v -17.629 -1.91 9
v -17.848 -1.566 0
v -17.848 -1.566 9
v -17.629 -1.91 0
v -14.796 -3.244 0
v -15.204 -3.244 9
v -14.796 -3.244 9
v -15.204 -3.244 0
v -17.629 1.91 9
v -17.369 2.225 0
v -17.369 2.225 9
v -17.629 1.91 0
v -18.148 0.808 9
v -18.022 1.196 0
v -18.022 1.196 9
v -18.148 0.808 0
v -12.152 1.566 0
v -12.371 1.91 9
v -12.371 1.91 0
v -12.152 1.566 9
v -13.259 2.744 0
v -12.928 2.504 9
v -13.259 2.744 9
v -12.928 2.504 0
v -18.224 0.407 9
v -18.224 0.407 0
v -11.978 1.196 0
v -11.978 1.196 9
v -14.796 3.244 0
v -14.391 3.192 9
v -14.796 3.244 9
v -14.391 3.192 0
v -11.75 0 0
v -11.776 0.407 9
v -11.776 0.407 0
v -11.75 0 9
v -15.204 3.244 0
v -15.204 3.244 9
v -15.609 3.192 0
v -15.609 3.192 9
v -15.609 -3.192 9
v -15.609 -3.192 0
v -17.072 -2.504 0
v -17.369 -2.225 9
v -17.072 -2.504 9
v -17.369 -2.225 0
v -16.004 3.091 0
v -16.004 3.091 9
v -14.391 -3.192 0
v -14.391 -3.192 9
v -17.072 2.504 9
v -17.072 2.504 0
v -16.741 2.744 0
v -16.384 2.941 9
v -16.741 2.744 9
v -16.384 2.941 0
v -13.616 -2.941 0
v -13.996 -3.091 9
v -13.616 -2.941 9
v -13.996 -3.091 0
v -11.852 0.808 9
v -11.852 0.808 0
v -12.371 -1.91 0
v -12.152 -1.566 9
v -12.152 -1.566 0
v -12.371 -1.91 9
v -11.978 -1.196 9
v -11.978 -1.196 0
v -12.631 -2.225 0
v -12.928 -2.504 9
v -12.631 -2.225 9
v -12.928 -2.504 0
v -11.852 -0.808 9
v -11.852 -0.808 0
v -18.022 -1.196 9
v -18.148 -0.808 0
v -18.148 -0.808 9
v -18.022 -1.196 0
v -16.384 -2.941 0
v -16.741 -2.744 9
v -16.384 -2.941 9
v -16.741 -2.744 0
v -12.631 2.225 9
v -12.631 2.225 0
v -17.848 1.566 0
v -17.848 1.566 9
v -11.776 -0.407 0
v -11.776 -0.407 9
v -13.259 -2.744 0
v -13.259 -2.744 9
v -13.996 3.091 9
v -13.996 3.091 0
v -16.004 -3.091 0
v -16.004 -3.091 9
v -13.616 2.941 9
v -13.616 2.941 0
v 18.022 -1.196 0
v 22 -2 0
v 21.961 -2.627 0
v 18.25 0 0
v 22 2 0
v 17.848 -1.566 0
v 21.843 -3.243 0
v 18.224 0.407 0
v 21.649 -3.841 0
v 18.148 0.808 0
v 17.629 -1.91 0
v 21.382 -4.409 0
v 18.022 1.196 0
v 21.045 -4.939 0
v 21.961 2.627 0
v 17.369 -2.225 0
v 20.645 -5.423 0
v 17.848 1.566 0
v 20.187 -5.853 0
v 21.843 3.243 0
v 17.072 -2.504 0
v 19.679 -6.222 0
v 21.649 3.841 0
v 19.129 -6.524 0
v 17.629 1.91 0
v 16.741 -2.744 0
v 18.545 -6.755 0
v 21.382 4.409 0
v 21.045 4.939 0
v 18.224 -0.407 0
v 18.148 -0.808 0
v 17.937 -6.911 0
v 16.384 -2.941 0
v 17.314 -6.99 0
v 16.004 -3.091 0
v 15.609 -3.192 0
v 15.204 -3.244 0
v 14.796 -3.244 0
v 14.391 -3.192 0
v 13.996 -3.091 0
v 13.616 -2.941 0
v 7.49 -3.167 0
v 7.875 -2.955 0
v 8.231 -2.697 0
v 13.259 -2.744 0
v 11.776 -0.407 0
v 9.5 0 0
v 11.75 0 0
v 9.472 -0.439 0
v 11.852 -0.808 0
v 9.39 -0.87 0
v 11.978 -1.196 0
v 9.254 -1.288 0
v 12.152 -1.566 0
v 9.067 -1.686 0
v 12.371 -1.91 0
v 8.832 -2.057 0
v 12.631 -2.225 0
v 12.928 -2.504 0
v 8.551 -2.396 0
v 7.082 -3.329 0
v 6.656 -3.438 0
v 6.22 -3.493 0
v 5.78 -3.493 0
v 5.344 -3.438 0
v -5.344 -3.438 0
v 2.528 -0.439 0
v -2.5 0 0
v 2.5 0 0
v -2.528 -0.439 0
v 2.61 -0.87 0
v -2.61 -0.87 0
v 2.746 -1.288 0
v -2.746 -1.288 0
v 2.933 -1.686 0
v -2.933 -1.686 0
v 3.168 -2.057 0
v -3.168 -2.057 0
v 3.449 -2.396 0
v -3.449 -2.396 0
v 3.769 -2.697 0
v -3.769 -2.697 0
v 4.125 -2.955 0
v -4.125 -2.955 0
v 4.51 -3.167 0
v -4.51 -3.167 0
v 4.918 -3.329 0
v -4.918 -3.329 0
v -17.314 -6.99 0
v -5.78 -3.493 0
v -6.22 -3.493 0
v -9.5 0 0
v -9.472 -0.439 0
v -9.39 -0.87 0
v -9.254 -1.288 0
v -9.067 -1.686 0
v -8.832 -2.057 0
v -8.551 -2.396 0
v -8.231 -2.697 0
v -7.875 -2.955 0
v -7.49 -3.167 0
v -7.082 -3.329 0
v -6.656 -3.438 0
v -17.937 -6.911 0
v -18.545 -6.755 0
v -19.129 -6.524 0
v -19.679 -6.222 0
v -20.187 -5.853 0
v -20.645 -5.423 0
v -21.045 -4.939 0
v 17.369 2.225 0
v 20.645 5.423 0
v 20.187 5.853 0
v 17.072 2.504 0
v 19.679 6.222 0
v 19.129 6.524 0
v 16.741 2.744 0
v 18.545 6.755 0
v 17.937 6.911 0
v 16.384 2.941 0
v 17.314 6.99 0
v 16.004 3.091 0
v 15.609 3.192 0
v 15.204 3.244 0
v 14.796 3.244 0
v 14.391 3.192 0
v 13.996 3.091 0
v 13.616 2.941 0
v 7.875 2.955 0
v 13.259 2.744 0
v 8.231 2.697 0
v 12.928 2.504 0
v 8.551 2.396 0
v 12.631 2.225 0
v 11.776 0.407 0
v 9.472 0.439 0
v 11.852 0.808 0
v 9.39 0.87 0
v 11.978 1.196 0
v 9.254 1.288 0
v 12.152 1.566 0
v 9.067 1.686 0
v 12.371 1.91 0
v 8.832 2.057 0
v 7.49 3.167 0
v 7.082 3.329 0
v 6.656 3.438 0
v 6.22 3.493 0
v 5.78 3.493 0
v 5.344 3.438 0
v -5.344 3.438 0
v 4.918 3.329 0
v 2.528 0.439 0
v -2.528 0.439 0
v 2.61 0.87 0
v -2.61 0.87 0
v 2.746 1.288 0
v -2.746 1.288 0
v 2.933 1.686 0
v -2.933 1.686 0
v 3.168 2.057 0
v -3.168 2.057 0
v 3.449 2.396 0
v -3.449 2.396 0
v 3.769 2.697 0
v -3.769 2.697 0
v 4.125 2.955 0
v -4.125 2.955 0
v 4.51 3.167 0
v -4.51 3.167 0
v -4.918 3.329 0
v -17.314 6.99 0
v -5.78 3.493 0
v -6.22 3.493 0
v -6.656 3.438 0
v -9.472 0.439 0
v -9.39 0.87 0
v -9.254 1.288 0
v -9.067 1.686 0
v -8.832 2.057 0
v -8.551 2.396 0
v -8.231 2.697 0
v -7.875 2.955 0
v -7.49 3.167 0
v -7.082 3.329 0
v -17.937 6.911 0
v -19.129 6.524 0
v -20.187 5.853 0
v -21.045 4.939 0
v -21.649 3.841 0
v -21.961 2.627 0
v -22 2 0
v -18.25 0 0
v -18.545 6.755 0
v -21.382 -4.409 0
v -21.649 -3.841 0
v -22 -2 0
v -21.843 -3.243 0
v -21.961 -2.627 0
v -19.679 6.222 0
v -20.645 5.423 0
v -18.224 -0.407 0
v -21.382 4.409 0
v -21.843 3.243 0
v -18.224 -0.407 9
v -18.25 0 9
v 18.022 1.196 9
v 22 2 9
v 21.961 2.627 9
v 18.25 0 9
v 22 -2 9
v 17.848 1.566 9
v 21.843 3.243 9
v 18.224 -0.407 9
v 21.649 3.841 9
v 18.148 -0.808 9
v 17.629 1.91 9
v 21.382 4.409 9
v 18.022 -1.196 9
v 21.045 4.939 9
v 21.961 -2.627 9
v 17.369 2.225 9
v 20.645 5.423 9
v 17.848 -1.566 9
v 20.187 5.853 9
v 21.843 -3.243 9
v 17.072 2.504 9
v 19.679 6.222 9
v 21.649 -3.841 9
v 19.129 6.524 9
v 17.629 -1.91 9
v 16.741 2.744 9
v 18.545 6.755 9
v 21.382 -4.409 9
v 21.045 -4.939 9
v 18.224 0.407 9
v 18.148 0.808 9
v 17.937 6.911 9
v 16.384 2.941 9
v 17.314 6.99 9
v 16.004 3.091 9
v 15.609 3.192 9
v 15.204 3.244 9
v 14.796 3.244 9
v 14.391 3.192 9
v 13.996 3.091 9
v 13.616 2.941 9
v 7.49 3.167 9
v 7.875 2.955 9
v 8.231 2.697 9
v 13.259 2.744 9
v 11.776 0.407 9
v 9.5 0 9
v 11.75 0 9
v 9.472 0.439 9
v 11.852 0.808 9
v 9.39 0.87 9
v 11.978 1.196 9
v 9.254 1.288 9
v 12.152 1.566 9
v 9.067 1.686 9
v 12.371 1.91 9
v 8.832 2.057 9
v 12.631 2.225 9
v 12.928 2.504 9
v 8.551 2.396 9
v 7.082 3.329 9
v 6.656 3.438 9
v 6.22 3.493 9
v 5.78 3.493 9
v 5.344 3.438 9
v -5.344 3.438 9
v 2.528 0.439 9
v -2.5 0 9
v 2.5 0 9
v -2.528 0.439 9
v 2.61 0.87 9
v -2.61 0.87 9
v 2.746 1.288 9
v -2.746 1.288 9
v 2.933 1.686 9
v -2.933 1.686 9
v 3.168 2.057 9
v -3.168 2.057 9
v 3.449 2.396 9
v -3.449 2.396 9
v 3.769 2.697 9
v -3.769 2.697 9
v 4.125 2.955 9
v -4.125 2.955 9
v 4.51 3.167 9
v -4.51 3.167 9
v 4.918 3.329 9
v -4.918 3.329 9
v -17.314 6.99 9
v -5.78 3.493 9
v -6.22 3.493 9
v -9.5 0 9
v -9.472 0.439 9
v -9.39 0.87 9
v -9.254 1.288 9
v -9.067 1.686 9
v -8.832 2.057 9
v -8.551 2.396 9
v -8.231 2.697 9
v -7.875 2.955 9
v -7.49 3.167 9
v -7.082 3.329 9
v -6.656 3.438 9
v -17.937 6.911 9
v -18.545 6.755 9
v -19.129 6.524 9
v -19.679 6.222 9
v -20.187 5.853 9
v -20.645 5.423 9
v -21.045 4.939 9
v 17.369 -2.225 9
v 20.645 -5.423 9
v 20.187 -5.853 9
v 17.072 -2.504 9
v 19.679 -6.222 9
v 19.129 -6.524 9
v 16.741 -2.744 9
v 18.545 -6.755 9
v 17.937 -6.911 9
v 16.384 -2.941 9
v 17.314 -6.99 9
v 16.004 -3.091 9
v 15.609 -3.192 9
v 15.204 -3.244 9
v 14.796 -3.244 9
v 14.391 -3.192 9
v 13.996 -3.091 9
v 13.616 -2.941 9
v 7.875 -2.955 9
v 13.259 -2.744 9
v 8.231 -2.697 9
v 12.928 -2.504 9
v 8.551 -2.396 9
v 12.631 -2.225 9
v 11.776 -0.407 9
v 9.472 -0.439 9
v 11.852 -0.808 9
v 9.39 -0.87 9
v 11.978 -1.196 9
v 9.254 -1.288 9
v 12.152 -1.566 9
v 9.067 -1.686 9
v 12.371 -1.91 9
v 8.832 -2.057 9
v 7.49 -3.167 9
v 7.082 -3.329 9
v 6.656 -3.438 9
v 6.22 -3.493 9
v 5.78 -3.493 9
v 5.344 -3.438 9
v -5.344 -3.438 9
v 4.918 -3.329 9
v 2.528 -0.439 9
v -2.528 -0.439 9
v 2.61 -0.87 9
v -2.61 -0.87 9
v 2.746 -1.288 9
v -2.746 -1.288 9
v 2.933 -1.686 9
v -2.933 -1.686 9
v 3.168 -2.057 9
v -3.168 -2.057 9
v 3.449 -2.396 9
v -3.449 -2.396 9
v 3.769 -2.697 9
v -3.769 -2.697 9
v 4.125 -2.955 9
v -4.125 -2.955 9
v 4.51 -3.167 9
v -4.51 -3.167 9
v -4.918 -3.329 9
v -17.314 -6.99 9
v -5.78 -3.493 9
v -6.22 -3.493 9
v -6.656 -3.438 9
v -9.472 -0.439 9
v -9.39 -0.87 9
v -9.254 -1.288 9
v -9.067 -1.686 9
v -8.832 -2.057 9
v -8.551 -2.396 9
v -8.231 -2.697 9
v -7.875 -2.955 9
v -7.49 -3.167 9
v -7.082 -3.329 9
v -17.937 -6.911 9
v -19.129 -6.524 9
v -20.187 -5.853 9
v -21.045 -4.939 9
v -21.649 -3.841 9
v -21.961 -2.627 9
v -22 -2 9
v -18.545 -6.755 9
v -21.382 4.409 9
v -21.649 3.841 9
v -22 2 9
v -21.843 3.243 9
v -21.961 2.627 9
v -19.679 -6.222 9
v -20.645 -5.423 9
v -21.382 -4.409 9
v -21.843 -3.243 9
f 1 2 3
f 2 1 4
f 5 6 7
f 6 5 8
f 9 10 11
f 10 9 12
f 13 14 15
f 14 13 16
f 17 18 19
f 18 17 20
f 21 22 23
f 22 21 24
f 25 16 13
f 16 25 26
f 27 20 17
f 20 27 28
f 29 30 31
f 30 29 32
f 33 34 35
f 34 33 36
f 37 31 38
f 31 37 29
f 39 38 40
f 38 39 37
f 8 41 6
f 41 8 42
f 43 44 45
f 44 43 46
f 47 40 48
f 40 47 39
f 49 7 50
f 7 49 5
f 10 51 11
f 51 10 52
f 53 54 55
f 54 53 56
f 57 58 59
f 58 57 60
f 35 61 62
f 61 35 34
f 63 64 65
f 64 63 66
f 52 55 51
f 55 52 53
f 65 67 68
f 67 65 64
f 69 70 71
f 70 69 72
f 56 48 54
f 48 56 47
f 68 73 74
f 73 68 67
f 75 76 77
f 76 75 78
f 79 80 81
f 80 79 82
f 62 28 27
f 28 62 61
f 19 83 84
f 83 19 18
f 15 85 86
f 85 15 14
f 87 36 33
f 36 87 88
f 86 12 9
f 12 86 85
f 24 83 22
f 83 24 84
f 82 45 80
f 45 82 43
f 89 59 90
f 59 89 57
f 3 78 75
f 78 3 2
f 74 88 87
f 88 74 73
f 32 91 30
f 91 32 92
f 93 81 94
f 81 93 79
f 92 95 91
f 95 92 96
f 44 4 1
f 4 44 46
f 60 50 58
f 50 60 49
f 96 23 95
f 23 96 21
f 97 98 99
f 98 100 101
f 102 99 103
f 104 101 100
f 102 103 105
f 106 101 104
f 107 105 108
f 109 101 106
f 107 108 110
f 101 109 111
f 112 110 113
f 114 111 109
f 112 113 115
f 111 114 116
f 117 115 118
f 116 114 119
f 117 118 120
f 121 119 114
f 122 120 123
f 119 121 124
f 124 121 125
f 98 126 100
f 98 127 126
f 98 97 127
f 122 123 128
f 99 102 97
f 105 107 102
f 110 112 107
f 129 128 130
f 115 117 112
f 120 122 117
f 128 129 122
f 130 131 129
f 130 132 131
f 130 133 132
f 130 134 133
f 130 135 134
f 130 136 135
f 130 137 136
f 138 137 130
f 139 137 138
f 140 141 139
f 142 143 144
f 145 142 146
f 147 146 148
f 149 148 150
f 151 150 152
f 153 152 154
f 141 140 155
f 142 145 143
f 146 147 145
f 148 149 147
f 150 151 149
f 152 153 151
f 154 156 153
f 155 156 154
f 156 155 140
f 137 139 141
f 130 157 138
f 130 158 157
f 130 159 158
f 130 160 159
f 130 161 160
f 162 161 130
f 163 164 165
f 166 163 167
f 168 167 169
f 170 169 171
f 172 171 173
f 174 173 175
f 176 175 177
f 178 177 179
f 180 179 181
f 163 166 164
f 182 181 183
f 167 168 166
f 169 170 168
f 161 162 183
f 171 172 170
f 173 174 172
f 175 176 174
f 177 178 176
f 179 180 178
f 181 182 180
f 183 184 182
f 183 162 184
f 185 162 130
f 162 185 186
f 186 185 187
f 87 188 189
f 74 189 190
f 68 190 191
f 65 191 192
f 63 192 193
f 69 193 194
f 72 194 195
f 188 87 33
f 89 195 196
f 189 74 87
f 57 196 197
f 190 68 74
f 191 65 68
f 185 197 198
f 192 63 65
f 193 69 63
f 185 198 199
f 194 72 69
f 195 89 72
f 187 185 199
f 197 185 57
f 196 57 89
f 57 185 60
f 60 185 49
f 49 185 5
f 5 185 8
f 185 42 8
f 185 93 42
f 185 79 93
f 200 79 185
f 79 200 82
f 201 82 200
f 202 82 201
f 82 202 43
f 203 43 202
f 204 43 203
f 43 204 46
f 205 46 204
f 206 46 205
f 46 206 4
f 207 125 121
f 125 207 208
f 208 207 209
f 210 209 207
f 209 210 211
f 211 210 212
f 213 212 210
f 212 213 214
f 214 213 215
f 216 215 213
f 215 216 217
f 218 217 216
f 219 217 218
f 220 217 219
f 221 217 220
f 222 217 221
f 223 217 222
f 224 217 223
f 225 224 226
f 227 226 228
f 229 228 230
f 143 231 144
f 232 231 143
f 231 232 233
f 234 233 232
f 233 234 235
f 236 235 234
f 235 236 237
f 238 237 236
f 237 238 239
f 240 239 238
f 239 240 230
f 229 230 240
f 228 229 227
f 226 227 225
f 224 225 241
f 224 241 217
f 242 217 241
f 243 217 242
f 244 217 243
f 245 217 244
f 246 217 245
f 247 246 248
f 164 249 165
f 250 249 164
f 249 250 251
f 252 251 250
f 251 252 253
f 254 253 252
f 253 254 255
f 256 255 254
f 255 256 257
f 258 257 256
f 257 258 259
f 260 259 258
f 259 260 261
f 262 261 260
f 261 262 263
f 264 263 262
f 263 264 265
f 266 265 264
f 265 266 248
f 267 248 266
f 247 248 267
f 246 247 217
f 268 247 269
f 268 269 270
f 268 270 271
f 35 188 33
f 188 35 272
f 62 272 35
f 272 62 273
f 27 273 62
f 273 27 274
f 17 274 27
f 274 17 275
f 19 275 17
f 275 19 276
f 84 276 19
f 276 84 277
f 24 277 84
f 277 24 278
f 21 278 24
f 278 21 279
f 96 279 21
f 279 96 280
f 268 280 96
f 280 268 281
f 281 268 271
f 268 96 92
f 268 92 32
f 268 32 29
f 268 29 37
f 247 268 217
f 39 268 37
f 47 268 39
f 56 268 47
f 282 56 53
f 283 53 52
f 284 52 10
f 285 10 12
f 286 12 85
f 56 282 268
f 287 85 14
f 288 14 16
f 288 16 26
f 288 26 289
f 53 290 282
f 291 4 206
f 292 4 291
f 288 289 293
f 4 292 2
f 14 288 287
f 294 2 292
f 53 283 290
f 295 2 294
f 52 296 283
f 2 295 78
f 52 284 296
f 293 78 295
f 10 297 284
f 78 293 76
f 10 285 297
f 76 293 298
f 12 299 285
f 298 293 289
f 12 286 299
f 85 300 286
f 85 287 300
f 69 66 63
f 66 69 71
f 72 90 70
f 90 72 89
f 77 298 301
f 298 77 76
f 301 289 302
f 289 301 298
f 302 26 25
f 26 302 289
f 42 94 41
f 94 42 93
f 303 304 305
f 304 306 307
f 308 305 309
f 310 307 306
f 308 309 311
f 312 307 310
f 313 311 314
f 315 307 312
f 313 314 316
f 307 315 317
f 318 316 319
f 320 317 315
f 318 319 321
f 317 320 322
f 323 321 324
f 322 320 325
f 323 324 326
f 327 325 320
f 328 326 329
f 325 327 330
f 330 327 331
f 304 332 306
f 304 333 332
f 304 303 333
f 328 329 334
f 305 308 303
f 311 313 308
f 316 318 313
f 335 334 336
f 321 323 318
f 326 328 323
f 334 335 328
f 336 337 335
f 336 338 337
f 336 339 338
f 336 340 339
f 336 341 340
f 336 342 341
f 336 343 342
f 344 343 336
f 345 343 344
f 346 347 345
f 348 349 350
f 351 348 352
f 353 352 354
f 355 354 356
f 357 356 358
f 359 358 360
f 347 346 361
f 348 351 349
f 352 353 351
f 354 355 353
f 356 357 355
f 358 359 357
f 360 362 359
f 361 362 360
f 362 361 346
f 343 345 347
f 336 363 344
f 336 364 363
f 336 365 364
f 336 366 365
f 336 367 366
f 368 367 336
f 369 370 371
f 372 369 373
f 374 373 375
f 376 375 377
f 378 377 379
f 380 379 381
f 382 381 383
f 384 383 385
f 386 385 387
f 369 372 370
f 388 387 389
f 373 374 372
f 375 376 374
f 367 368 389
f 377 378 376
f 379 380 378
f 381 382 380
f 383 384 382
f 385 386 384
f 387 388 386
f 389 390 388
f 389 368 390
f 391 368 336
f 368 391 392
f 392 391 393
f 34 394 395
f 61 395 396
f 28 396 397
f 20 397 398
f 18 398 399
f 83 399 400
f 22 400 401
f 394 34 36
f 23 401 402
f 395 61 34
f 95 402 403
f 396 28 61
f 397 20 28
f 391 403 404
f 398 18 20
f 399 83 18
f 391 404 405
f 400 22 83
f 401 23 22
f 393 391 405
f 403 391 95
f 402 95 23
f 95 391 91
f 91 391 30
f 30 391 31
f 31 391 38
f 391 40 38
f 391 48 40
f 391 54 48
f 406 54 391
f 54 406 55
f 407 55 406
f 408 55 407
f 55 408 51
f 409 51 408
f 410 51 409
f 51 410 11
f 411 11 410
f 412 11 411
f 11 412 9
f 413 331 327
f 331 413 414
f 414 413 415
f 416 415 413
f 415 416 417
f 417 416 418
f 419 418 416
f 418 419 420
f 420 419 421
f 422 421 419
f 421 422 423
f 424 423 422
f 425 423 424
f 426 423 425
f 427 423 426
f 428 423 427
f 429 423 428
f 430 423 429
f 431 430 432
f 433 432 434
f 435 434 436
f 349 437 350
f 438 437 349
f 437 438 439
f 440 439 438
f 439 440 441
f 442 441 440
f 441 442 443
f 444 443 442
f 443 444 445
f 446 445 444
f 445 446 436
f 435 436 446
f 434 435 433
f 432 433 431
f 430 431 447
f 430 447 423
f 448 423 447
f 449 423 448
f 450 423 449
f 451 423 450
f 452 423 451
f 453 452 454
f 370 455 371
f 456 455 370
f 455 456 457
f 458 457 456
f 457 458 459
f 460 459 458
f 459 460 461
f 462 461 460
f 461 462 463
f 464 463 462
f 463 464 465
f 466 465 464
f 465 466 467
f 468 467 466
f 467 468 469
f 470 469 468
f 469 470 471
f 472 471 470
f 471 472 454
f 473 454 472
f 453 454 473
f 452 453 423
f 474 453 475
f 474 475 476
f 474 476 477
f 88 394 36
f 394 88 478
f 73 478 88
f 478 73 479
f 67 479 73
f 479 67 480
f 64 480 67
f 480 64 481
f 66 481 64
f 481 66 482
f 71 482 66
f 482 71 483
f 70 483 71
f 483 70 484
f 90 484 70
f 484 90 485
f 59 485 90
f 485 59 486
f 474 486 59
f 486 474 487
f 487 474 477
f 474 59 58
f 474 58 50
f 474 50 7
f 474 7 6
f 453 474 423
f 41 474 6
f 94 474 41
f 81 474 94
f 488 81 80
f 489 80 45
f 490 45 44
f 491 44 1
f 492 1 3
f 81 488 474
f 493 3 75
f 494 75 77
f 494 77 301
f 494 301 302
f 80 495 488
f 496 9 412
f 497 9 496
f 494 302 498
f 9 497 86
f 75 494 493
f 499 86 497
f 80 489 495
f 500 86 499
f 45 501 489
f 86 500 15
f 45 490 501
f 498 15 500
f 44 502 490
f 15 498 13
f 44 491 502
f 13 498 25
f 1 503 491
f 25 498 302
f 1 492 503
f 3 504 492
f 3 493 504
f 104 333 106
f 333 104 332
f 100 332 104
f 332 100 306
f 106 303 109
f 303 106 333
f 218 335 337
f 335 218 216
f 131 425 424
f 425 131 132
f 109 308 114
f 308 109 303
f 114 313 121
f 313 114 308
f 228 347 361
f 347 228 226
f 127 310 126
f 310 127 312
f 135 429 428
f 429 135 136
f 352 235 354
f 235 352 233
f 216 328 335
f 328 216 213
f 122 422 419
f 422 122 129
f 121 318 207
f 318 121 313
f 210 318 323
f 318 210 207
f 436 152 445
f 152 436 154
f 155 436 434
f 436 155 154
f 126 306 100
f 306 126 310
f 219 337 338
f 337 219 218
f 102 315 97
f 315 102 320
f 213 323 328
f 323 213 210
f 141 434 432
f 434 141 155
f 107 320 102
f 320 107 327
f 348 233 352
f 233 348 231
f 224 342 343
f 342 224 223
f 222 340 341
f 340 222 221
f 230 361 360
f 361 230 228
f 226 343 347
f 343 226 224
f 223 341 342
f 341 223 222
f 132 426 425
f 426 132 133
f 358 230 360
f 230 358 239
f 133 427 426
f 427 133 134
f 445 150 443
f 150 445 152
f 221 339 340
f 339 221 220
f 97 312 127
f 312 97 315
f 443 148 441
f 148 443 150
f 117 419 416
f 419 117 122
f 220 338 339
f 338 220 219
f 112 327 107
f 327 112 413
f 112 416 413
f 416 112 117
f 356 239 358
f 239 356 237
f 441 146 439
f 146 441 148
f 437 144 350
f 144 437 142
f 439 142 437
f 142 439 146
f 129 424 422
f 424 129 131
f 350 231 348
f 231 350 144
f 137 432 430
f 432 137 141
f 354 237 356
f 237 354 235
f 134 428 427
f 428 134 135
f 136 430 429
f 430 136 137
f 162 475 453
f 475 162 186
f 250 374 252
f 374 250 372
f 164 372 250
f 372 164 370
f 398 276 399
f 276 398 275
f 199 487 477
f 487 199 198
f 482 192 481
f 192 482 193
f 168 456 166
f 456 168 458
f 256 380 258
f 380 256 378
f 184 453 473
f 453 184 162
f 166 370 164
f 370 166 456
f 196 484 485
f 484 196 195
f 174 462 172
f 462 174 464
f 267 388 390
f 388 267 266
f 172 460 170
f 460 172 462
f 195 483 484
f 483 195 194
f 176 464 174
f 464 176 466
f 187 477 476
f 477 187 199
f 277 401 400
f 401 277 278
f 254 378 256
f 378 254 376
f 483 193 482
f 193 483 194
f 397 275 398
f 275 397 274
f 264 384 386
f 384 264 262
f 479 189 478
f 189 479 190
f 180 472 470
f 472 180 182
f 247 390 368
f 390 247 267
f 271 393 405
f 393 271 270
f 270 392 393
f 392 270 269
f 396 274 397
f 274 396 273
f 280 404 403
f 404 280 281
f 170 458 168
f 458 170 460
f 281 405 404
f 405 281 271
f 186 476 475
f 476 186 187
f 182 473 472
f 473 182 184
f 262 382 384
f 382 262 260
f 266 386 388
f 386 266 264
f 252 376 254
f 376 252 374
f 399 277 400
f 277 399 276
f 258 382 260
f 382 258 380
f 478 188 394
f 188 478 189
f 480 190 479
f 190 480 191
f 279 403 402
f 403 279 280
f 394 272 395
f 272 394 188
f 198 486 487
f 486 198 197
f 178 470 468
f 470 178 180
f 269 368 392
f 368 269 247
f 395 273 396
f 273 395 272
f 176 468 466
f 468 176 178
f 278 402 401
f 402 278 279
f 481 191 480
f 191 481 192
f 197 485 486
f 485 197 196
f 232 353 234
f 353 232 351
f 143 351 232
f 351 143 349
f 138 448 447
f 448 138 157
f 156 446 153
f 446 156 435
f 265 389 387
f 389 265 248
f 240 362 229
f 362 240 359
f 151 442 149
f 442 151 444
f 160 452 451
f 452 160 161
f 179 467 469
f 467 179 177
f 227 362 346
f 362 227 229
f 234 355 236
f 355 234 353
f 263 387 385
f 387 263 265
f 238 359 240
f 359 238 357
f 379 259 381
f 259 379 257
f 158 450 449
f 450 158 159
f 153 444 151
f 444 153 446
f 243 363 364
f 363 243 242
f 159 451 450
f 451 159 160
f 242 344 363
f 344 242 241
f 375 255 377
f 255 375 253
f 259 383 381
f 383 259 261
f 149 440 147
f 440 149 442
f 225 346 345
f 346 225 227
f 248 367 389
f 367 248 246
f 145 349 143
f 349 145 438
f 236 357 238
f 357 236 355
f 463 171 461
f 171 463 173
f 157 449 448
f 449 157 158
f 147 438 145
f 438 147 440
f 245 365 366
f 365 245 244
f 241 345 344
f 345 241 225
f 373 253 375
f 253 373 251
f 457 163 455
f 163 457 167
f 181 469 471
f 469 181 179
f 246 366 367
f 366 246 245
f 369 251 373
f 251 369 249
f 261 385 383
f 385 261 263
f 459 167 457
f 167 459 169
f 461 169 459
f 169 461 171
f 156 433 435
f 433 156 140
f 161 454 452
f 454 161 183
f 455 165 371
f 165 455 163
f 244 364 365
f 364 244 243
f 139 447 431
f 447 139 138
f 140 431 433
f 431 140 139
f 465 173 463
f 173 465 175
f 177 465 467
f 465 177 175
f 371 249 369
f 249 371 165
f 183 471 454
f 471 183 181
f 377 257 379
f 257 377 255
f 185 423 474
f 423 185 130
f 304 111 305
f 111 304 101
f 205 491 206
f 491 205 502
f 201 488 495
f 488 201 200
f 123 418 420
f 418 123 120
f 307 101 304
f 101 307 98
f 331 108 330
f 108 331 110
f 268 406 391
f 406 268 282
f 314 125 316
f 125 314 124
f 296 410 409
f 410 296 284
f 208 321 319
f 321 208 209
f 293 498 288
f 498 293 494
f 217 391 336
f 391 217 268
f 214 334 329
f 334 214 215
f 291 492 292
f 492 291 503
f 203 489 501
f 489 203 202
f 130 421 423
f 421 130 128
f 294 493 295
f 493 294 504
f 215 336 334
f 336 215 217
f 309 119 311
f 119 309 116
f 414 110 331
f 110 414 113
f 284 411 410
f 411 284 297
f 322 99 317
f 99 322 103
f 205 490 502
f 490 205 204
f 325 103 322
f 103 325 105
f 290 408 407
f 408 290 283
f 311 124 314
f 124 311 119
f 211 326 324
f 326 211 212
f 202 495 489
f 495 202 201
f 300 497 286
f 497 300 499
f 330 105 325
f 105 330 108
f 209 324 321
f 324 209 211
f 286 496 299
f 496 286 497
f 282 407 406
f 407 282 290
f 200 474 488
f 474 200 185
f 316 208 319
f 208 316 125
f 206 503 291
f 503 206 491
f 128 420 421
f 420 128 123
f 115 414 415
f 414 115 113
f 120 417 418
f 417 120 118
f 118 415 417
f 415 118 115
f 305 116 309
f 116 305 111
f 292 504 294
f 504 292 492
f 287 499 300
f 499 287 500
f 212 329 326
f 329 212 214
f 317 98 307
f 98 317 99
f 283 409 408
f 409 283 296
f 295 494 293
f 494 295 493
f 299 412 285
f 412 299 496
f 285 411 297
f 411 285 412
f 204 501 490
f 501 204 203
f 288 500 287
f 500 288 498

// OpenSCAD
$fn = 50;

difference() {
	union() {
		hull() {
			translate(v = [-17.0, 2.0, 0]) {
				cylinder(h = 9, r = 5);
			}
			translate(v = [17.0, 2.0, 0]) {
				cylinder(h = 9, r = 5);
			}
			translate(v = [-17.0, -2.0, 0]) {
				cylinder(h = 9, r = 5);
			}
			translate(v = [17.0, -2.0, 0]) {
				cylinder(h = 9, r = 5);
			}
		}
	}
	union() {
		translate(v = [-15.0, 0.0, 0]) {
			cylinder(h = 9, r = 3.25);
		}
		translate(v = [15.0, 0.0, 0]) {
			cylinder(h = 9, r = 3.25);
		}
		translate(v = [-6.0, 0, 0.0]) {
			cylinder(h = 9, r = 3.5);
		}
		translate(v = [6.0, 0, 0.0]) {
			cylinder(h = 9, r = 3.5);
		}
	}
}
